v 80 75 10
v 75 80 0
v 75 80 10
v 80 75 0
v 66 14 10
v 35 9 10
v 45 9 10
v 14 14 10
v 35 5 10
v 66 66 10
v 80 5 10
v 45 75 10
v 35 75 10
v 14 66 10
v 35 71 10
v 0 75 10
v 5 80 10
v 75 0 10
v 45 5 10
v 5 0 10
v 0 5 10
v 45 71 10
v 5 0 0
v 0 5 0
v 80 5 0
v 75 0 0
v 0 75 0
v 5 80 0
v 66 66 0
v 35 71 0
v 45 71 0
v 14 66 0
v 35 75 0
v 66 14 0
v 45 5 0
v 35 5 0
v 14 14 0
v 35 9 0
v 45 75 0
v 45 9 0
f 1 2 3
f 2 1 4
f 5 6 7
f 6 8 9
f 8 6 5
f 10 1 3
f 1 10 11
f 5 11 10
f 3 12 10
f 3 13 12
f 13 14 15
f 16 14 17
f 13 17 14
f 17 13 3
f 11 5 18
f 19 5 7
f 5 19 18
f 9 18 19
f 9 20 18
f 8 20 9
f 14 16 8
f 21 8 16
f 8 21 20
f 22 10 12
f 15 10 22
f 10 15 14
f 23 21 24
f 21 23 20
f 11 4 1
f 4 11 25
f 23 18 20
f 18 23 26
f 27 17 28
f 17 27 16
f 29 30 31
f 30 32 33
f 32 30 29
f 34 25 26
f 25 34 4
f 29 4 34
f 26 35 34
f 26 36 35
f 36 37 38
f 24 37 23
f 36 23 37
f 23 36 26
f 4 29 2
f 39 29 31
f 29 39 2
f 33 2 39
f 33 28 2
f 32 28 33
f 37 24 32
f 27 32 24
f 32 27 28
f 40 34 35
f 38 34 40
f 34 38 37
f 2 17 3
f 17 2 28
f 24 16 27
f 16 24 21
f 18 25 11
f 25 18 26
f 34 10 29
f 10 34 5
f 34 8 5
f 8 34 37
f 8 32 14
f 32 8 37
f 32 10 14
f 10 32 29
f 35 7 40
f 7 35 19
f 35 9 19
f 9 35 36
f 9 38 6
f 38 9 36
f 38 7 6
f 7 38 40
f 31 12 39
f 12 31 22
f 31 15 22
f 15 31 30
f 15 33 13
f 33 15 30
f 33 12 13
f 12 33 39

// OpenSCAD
$fn = 32;

// ----------------------------------------------------------------------
// Frame plate: 80 x 80 frame, 14 mm rails
// ----------------------------------------------------------------------

// --- parameters (mm) ---
plate_l = 80;             // plate length, X
plate_w = 80;             // plate width, Y
plate_t = 10;             // plate thickness, Z (extrusion height)
corner_c = 5;             // corner chamfer
frame_bar = 14;           // frame rail width
slot_l = 10;              // adjustment slot length
slot_w = 4;               // adjustment slot width

win_l = plate_l - 2 * frame_bar;  // window length
win_w = plate_w - 2 * frame_bar;  // window width

profile = [[5, 0], [75, 0], [80, 5], [80, 75], [75, 80], [5, 80], [0, 75], [0, 5]];  // primary outline, 8 points, counter clockwise
void_1 = [[14, 14], [66, 14], [66, 66], [14, 66]];  // the window, 4 points
void_2 = [[35, 5], [45, 5], [45, 9], [35, 9]];  // adjustment slot, 4 points
void_3 = [[35, 71], [45, 71], [45, 75], [35, 75]];  // adjustment slot, 4 points

// --- the one profile operation ---
difference() {
  linear_extrude(height = plate_t) polygon(points = profile);
  translate([0, 0, -1])
    linear_extrude(height = plate_t + 2) polygon(points = void_1);
  translate([0, 0, -1])
    linear_extrude(height = plate_t + 2) polygon(points = void_2);
  translate([0, 0, -1])
    linear_extrude(height = plate_t + 2) polygon(points = void_3);
}
